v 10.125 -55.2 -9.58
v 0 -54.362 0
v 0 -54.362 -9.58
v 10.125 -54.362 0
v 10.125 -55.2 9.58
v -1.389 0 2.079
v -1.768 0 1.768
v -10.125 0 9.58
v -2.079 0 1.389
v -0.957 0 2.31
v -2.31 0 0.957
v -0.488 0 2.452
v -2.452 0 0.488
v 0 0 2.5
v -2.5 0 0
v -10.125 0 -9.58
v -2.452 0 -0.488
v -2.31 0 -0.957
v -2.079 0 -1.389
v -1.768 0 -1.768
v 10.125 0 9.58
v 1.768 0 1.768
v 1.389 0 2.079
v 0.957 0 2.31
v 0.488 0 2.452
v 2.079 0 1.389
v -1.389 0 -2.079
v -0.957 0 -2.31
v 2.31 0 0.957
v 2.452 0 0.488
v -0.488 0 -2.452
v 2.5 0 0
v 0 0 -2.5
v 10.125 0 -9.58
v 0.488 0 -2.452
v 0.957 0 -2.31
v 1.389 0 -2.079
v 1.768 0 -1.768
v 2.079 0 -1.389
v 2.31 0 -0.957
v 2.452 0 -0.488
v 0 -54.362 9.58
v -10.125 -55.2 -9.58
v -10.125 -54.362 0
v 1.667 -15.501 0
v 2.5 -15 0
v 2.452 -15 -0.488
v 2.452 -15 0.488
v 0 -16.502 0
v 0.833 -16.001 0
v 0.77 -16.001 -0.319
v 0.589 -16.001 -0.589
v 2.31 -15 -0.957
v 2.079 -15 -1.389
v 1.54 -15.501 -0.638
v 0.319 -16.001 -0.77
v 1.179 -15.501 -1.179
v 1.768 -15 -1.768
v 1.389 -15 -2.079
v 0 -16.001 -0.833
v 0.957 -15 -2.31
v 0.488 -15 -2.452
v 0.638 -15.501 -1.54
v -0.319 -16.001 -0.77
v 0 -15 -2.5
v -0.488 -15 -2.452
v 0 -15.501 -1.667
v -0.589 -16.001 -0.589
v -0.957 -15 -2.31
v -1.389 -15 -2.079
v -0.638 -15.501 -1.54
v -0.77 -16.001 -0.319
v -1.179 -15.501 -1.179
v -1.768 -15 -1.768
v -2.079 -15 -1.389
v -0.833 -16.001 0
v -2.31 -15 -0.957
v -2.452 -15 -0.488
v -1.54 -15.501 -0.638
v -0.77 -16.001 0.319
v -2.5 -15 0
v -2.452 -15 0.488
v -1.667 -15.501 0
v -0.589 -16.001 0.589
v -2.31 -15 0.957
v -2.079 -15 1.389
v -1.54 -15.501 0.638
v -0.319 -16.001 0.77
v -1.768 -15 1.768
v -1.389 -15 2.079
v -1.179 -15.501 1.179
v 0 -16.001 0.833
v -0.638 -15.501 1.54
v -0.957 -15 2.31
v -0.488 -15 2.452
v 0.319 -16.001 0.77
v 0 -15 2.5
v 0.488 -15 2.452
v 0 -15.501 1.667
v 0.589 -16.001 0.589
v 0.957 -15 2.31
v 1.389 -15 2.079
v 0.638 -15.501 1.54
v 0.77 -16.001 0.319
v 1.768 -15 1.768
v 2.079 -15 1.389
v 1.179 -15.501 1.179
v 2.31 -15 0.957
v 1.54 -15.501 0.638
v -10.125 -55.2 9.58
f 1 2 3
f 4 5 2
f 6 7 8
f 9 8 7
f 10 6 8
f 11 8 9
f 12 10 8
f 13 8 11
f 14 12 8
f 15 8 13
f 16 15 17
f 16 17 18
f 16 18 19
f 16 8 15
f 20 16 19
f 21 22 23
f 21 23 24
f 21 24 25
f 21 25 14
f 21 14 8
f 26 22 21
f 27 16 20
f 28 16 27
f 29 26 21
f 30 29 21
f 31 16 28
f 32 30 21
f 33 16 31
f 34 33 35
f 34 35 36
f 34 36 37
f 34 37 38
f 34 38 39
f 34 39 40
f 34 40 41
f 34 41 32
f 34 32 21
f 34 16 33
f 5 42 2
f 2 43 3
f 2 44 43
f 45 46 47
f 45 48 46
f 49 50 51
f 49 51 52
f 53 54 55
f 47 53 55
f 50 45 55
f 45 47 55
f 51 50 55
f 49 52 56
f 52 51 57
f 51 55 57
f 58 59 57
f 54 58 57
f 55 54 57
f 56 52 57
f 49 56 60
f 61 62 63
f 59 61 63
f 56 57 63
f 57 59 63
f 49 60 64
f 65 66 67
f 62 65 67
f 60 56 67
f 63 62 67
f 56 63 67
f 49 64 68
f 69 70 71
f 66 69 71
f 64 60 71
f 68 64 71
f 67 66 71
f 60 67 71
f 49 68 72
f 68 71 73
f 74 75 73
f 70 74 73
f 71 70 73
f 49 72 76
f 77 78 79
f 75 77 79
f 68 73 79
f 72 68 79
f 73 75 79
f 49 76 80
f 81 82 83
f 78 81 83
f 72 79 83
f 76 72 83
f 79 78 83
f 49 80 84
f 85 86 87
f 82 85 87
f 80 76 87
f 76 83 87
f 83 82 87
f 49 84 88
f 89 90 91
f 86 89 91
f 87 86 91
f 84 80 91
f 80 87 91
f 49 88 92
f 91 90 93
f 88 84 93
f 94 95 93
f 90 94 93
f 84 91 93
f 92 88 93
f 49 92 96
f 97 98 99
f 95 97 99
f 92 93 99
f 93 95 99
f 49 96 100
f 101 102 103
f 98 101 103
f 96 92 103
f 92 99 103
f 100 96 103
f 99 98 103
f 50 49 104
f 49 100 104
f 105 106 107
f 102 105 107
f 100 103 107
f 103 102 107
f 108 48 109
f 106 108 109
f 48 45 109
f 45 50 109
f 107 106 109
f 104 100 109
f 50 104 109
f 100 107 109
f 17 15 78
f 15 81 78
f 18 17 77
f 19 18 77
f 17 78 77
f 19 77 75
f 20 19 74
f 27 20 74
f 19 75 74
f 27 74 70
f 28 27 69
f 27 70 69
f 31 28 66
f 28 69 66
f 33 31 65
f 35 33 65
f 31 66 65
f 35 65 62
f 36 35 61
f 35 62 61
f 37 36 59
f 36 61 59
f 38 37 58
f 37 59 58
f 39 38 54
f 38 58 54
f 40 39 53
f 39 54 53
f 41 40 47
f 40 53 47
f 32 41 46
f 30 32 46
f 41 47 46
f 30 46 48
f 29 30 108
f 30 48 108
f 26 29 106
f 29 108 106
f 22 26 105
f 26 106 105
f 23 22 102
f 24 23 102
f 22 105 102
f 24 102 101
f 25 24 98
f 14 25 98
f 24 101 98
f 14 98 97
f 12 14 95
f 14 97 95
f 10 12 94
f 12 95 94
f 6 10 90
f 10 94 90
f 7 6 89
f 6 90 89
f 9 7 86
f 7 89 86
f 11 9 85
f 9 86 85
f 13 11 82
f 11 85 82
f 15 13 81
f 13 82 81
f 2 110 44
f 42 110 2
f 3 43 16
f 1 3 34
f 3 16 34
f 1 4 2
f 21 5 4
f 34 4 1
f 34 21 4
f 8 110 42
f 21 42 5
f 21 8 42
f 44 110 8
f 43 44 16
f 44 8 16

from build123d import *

# Parameters (mm, degrees)
SKETCH1_W             = 20.25
SKETCH1_H             = 19.16
BOSS_EXTRUDE1_DEPTH   = 55.2
CUT_EXTRUDE2_DEPTH    = 60.572467634
CUT_EXTRUDE3_DEPTH    = 60.301443701
M6_TAPPED_HOLE1_D     = 5
M6_TAPPED_HOLE1_DEPTH = 15
M6_TAPPED_HOLE1_TIP   = 1.502151548


with BuildPart() as part:
    # Sketch1 → Boss-Extrude1 (new body)
    with BuildSketch(Plane(origin=(0, 0, 0), x_dir=(1, 0, 0), z_dir=(0, 1, 0))):
        Rectangle(SKETCH1_W, SKETCH1_H)
    extrude(amount=-BOSS_EXTRUDE1_DEPTH)

    # Sketch5 → Cut-Extrude2 (cut, through all)
    with BuildSketch(Plane(origin=(10.125, 0, 0), x_dir=(0, 0, -1), z_dir=(1, 0, 0))):
        Polygon((-9.58, -55.2), (0, -54.361858603), (9.58, -55.2), align=None)
    extrude(amount=-CUT_EXTRUDE2_DEPTH, mode=Mode.SUBTRACT)

    # Sketch6 → Cut-Extrude3 (cut, through all)
    with BuildSketch(Plane.XY.offset(9.58)):
        Polygon((-10.125, -55.2), (0, -54.361858603), (10.125, -55.2), align=None)
    extrude(amount=-CUT_EXTRUDE3_DEPTH, mode=Mode.SUBTRACT)

    # M6 Tapped Hole1
    with Locations(Plane(origin=(0, 0, 0), x_dir=(1, 0, 0), z_dir=(0, 1, 0))):
        with Locations((0, 0)):
            Hole(M6_TAPPED_HOLE1_D / 2, depth=M6_TAPPED_HOLE1_DEPTH)
            with Locations((0, 0, -(M6_TAPPED_HOLE1_DEPTH + M6_TAPPED_HOLE1_TIP / 2))):  # 118° drill point
                Cone(0, M6_TAPPED_HOLE1_D / 2, M6_TAPPED_HOLE1_TIP, mode=Mode.SUBTRACT)


solid = part.part
